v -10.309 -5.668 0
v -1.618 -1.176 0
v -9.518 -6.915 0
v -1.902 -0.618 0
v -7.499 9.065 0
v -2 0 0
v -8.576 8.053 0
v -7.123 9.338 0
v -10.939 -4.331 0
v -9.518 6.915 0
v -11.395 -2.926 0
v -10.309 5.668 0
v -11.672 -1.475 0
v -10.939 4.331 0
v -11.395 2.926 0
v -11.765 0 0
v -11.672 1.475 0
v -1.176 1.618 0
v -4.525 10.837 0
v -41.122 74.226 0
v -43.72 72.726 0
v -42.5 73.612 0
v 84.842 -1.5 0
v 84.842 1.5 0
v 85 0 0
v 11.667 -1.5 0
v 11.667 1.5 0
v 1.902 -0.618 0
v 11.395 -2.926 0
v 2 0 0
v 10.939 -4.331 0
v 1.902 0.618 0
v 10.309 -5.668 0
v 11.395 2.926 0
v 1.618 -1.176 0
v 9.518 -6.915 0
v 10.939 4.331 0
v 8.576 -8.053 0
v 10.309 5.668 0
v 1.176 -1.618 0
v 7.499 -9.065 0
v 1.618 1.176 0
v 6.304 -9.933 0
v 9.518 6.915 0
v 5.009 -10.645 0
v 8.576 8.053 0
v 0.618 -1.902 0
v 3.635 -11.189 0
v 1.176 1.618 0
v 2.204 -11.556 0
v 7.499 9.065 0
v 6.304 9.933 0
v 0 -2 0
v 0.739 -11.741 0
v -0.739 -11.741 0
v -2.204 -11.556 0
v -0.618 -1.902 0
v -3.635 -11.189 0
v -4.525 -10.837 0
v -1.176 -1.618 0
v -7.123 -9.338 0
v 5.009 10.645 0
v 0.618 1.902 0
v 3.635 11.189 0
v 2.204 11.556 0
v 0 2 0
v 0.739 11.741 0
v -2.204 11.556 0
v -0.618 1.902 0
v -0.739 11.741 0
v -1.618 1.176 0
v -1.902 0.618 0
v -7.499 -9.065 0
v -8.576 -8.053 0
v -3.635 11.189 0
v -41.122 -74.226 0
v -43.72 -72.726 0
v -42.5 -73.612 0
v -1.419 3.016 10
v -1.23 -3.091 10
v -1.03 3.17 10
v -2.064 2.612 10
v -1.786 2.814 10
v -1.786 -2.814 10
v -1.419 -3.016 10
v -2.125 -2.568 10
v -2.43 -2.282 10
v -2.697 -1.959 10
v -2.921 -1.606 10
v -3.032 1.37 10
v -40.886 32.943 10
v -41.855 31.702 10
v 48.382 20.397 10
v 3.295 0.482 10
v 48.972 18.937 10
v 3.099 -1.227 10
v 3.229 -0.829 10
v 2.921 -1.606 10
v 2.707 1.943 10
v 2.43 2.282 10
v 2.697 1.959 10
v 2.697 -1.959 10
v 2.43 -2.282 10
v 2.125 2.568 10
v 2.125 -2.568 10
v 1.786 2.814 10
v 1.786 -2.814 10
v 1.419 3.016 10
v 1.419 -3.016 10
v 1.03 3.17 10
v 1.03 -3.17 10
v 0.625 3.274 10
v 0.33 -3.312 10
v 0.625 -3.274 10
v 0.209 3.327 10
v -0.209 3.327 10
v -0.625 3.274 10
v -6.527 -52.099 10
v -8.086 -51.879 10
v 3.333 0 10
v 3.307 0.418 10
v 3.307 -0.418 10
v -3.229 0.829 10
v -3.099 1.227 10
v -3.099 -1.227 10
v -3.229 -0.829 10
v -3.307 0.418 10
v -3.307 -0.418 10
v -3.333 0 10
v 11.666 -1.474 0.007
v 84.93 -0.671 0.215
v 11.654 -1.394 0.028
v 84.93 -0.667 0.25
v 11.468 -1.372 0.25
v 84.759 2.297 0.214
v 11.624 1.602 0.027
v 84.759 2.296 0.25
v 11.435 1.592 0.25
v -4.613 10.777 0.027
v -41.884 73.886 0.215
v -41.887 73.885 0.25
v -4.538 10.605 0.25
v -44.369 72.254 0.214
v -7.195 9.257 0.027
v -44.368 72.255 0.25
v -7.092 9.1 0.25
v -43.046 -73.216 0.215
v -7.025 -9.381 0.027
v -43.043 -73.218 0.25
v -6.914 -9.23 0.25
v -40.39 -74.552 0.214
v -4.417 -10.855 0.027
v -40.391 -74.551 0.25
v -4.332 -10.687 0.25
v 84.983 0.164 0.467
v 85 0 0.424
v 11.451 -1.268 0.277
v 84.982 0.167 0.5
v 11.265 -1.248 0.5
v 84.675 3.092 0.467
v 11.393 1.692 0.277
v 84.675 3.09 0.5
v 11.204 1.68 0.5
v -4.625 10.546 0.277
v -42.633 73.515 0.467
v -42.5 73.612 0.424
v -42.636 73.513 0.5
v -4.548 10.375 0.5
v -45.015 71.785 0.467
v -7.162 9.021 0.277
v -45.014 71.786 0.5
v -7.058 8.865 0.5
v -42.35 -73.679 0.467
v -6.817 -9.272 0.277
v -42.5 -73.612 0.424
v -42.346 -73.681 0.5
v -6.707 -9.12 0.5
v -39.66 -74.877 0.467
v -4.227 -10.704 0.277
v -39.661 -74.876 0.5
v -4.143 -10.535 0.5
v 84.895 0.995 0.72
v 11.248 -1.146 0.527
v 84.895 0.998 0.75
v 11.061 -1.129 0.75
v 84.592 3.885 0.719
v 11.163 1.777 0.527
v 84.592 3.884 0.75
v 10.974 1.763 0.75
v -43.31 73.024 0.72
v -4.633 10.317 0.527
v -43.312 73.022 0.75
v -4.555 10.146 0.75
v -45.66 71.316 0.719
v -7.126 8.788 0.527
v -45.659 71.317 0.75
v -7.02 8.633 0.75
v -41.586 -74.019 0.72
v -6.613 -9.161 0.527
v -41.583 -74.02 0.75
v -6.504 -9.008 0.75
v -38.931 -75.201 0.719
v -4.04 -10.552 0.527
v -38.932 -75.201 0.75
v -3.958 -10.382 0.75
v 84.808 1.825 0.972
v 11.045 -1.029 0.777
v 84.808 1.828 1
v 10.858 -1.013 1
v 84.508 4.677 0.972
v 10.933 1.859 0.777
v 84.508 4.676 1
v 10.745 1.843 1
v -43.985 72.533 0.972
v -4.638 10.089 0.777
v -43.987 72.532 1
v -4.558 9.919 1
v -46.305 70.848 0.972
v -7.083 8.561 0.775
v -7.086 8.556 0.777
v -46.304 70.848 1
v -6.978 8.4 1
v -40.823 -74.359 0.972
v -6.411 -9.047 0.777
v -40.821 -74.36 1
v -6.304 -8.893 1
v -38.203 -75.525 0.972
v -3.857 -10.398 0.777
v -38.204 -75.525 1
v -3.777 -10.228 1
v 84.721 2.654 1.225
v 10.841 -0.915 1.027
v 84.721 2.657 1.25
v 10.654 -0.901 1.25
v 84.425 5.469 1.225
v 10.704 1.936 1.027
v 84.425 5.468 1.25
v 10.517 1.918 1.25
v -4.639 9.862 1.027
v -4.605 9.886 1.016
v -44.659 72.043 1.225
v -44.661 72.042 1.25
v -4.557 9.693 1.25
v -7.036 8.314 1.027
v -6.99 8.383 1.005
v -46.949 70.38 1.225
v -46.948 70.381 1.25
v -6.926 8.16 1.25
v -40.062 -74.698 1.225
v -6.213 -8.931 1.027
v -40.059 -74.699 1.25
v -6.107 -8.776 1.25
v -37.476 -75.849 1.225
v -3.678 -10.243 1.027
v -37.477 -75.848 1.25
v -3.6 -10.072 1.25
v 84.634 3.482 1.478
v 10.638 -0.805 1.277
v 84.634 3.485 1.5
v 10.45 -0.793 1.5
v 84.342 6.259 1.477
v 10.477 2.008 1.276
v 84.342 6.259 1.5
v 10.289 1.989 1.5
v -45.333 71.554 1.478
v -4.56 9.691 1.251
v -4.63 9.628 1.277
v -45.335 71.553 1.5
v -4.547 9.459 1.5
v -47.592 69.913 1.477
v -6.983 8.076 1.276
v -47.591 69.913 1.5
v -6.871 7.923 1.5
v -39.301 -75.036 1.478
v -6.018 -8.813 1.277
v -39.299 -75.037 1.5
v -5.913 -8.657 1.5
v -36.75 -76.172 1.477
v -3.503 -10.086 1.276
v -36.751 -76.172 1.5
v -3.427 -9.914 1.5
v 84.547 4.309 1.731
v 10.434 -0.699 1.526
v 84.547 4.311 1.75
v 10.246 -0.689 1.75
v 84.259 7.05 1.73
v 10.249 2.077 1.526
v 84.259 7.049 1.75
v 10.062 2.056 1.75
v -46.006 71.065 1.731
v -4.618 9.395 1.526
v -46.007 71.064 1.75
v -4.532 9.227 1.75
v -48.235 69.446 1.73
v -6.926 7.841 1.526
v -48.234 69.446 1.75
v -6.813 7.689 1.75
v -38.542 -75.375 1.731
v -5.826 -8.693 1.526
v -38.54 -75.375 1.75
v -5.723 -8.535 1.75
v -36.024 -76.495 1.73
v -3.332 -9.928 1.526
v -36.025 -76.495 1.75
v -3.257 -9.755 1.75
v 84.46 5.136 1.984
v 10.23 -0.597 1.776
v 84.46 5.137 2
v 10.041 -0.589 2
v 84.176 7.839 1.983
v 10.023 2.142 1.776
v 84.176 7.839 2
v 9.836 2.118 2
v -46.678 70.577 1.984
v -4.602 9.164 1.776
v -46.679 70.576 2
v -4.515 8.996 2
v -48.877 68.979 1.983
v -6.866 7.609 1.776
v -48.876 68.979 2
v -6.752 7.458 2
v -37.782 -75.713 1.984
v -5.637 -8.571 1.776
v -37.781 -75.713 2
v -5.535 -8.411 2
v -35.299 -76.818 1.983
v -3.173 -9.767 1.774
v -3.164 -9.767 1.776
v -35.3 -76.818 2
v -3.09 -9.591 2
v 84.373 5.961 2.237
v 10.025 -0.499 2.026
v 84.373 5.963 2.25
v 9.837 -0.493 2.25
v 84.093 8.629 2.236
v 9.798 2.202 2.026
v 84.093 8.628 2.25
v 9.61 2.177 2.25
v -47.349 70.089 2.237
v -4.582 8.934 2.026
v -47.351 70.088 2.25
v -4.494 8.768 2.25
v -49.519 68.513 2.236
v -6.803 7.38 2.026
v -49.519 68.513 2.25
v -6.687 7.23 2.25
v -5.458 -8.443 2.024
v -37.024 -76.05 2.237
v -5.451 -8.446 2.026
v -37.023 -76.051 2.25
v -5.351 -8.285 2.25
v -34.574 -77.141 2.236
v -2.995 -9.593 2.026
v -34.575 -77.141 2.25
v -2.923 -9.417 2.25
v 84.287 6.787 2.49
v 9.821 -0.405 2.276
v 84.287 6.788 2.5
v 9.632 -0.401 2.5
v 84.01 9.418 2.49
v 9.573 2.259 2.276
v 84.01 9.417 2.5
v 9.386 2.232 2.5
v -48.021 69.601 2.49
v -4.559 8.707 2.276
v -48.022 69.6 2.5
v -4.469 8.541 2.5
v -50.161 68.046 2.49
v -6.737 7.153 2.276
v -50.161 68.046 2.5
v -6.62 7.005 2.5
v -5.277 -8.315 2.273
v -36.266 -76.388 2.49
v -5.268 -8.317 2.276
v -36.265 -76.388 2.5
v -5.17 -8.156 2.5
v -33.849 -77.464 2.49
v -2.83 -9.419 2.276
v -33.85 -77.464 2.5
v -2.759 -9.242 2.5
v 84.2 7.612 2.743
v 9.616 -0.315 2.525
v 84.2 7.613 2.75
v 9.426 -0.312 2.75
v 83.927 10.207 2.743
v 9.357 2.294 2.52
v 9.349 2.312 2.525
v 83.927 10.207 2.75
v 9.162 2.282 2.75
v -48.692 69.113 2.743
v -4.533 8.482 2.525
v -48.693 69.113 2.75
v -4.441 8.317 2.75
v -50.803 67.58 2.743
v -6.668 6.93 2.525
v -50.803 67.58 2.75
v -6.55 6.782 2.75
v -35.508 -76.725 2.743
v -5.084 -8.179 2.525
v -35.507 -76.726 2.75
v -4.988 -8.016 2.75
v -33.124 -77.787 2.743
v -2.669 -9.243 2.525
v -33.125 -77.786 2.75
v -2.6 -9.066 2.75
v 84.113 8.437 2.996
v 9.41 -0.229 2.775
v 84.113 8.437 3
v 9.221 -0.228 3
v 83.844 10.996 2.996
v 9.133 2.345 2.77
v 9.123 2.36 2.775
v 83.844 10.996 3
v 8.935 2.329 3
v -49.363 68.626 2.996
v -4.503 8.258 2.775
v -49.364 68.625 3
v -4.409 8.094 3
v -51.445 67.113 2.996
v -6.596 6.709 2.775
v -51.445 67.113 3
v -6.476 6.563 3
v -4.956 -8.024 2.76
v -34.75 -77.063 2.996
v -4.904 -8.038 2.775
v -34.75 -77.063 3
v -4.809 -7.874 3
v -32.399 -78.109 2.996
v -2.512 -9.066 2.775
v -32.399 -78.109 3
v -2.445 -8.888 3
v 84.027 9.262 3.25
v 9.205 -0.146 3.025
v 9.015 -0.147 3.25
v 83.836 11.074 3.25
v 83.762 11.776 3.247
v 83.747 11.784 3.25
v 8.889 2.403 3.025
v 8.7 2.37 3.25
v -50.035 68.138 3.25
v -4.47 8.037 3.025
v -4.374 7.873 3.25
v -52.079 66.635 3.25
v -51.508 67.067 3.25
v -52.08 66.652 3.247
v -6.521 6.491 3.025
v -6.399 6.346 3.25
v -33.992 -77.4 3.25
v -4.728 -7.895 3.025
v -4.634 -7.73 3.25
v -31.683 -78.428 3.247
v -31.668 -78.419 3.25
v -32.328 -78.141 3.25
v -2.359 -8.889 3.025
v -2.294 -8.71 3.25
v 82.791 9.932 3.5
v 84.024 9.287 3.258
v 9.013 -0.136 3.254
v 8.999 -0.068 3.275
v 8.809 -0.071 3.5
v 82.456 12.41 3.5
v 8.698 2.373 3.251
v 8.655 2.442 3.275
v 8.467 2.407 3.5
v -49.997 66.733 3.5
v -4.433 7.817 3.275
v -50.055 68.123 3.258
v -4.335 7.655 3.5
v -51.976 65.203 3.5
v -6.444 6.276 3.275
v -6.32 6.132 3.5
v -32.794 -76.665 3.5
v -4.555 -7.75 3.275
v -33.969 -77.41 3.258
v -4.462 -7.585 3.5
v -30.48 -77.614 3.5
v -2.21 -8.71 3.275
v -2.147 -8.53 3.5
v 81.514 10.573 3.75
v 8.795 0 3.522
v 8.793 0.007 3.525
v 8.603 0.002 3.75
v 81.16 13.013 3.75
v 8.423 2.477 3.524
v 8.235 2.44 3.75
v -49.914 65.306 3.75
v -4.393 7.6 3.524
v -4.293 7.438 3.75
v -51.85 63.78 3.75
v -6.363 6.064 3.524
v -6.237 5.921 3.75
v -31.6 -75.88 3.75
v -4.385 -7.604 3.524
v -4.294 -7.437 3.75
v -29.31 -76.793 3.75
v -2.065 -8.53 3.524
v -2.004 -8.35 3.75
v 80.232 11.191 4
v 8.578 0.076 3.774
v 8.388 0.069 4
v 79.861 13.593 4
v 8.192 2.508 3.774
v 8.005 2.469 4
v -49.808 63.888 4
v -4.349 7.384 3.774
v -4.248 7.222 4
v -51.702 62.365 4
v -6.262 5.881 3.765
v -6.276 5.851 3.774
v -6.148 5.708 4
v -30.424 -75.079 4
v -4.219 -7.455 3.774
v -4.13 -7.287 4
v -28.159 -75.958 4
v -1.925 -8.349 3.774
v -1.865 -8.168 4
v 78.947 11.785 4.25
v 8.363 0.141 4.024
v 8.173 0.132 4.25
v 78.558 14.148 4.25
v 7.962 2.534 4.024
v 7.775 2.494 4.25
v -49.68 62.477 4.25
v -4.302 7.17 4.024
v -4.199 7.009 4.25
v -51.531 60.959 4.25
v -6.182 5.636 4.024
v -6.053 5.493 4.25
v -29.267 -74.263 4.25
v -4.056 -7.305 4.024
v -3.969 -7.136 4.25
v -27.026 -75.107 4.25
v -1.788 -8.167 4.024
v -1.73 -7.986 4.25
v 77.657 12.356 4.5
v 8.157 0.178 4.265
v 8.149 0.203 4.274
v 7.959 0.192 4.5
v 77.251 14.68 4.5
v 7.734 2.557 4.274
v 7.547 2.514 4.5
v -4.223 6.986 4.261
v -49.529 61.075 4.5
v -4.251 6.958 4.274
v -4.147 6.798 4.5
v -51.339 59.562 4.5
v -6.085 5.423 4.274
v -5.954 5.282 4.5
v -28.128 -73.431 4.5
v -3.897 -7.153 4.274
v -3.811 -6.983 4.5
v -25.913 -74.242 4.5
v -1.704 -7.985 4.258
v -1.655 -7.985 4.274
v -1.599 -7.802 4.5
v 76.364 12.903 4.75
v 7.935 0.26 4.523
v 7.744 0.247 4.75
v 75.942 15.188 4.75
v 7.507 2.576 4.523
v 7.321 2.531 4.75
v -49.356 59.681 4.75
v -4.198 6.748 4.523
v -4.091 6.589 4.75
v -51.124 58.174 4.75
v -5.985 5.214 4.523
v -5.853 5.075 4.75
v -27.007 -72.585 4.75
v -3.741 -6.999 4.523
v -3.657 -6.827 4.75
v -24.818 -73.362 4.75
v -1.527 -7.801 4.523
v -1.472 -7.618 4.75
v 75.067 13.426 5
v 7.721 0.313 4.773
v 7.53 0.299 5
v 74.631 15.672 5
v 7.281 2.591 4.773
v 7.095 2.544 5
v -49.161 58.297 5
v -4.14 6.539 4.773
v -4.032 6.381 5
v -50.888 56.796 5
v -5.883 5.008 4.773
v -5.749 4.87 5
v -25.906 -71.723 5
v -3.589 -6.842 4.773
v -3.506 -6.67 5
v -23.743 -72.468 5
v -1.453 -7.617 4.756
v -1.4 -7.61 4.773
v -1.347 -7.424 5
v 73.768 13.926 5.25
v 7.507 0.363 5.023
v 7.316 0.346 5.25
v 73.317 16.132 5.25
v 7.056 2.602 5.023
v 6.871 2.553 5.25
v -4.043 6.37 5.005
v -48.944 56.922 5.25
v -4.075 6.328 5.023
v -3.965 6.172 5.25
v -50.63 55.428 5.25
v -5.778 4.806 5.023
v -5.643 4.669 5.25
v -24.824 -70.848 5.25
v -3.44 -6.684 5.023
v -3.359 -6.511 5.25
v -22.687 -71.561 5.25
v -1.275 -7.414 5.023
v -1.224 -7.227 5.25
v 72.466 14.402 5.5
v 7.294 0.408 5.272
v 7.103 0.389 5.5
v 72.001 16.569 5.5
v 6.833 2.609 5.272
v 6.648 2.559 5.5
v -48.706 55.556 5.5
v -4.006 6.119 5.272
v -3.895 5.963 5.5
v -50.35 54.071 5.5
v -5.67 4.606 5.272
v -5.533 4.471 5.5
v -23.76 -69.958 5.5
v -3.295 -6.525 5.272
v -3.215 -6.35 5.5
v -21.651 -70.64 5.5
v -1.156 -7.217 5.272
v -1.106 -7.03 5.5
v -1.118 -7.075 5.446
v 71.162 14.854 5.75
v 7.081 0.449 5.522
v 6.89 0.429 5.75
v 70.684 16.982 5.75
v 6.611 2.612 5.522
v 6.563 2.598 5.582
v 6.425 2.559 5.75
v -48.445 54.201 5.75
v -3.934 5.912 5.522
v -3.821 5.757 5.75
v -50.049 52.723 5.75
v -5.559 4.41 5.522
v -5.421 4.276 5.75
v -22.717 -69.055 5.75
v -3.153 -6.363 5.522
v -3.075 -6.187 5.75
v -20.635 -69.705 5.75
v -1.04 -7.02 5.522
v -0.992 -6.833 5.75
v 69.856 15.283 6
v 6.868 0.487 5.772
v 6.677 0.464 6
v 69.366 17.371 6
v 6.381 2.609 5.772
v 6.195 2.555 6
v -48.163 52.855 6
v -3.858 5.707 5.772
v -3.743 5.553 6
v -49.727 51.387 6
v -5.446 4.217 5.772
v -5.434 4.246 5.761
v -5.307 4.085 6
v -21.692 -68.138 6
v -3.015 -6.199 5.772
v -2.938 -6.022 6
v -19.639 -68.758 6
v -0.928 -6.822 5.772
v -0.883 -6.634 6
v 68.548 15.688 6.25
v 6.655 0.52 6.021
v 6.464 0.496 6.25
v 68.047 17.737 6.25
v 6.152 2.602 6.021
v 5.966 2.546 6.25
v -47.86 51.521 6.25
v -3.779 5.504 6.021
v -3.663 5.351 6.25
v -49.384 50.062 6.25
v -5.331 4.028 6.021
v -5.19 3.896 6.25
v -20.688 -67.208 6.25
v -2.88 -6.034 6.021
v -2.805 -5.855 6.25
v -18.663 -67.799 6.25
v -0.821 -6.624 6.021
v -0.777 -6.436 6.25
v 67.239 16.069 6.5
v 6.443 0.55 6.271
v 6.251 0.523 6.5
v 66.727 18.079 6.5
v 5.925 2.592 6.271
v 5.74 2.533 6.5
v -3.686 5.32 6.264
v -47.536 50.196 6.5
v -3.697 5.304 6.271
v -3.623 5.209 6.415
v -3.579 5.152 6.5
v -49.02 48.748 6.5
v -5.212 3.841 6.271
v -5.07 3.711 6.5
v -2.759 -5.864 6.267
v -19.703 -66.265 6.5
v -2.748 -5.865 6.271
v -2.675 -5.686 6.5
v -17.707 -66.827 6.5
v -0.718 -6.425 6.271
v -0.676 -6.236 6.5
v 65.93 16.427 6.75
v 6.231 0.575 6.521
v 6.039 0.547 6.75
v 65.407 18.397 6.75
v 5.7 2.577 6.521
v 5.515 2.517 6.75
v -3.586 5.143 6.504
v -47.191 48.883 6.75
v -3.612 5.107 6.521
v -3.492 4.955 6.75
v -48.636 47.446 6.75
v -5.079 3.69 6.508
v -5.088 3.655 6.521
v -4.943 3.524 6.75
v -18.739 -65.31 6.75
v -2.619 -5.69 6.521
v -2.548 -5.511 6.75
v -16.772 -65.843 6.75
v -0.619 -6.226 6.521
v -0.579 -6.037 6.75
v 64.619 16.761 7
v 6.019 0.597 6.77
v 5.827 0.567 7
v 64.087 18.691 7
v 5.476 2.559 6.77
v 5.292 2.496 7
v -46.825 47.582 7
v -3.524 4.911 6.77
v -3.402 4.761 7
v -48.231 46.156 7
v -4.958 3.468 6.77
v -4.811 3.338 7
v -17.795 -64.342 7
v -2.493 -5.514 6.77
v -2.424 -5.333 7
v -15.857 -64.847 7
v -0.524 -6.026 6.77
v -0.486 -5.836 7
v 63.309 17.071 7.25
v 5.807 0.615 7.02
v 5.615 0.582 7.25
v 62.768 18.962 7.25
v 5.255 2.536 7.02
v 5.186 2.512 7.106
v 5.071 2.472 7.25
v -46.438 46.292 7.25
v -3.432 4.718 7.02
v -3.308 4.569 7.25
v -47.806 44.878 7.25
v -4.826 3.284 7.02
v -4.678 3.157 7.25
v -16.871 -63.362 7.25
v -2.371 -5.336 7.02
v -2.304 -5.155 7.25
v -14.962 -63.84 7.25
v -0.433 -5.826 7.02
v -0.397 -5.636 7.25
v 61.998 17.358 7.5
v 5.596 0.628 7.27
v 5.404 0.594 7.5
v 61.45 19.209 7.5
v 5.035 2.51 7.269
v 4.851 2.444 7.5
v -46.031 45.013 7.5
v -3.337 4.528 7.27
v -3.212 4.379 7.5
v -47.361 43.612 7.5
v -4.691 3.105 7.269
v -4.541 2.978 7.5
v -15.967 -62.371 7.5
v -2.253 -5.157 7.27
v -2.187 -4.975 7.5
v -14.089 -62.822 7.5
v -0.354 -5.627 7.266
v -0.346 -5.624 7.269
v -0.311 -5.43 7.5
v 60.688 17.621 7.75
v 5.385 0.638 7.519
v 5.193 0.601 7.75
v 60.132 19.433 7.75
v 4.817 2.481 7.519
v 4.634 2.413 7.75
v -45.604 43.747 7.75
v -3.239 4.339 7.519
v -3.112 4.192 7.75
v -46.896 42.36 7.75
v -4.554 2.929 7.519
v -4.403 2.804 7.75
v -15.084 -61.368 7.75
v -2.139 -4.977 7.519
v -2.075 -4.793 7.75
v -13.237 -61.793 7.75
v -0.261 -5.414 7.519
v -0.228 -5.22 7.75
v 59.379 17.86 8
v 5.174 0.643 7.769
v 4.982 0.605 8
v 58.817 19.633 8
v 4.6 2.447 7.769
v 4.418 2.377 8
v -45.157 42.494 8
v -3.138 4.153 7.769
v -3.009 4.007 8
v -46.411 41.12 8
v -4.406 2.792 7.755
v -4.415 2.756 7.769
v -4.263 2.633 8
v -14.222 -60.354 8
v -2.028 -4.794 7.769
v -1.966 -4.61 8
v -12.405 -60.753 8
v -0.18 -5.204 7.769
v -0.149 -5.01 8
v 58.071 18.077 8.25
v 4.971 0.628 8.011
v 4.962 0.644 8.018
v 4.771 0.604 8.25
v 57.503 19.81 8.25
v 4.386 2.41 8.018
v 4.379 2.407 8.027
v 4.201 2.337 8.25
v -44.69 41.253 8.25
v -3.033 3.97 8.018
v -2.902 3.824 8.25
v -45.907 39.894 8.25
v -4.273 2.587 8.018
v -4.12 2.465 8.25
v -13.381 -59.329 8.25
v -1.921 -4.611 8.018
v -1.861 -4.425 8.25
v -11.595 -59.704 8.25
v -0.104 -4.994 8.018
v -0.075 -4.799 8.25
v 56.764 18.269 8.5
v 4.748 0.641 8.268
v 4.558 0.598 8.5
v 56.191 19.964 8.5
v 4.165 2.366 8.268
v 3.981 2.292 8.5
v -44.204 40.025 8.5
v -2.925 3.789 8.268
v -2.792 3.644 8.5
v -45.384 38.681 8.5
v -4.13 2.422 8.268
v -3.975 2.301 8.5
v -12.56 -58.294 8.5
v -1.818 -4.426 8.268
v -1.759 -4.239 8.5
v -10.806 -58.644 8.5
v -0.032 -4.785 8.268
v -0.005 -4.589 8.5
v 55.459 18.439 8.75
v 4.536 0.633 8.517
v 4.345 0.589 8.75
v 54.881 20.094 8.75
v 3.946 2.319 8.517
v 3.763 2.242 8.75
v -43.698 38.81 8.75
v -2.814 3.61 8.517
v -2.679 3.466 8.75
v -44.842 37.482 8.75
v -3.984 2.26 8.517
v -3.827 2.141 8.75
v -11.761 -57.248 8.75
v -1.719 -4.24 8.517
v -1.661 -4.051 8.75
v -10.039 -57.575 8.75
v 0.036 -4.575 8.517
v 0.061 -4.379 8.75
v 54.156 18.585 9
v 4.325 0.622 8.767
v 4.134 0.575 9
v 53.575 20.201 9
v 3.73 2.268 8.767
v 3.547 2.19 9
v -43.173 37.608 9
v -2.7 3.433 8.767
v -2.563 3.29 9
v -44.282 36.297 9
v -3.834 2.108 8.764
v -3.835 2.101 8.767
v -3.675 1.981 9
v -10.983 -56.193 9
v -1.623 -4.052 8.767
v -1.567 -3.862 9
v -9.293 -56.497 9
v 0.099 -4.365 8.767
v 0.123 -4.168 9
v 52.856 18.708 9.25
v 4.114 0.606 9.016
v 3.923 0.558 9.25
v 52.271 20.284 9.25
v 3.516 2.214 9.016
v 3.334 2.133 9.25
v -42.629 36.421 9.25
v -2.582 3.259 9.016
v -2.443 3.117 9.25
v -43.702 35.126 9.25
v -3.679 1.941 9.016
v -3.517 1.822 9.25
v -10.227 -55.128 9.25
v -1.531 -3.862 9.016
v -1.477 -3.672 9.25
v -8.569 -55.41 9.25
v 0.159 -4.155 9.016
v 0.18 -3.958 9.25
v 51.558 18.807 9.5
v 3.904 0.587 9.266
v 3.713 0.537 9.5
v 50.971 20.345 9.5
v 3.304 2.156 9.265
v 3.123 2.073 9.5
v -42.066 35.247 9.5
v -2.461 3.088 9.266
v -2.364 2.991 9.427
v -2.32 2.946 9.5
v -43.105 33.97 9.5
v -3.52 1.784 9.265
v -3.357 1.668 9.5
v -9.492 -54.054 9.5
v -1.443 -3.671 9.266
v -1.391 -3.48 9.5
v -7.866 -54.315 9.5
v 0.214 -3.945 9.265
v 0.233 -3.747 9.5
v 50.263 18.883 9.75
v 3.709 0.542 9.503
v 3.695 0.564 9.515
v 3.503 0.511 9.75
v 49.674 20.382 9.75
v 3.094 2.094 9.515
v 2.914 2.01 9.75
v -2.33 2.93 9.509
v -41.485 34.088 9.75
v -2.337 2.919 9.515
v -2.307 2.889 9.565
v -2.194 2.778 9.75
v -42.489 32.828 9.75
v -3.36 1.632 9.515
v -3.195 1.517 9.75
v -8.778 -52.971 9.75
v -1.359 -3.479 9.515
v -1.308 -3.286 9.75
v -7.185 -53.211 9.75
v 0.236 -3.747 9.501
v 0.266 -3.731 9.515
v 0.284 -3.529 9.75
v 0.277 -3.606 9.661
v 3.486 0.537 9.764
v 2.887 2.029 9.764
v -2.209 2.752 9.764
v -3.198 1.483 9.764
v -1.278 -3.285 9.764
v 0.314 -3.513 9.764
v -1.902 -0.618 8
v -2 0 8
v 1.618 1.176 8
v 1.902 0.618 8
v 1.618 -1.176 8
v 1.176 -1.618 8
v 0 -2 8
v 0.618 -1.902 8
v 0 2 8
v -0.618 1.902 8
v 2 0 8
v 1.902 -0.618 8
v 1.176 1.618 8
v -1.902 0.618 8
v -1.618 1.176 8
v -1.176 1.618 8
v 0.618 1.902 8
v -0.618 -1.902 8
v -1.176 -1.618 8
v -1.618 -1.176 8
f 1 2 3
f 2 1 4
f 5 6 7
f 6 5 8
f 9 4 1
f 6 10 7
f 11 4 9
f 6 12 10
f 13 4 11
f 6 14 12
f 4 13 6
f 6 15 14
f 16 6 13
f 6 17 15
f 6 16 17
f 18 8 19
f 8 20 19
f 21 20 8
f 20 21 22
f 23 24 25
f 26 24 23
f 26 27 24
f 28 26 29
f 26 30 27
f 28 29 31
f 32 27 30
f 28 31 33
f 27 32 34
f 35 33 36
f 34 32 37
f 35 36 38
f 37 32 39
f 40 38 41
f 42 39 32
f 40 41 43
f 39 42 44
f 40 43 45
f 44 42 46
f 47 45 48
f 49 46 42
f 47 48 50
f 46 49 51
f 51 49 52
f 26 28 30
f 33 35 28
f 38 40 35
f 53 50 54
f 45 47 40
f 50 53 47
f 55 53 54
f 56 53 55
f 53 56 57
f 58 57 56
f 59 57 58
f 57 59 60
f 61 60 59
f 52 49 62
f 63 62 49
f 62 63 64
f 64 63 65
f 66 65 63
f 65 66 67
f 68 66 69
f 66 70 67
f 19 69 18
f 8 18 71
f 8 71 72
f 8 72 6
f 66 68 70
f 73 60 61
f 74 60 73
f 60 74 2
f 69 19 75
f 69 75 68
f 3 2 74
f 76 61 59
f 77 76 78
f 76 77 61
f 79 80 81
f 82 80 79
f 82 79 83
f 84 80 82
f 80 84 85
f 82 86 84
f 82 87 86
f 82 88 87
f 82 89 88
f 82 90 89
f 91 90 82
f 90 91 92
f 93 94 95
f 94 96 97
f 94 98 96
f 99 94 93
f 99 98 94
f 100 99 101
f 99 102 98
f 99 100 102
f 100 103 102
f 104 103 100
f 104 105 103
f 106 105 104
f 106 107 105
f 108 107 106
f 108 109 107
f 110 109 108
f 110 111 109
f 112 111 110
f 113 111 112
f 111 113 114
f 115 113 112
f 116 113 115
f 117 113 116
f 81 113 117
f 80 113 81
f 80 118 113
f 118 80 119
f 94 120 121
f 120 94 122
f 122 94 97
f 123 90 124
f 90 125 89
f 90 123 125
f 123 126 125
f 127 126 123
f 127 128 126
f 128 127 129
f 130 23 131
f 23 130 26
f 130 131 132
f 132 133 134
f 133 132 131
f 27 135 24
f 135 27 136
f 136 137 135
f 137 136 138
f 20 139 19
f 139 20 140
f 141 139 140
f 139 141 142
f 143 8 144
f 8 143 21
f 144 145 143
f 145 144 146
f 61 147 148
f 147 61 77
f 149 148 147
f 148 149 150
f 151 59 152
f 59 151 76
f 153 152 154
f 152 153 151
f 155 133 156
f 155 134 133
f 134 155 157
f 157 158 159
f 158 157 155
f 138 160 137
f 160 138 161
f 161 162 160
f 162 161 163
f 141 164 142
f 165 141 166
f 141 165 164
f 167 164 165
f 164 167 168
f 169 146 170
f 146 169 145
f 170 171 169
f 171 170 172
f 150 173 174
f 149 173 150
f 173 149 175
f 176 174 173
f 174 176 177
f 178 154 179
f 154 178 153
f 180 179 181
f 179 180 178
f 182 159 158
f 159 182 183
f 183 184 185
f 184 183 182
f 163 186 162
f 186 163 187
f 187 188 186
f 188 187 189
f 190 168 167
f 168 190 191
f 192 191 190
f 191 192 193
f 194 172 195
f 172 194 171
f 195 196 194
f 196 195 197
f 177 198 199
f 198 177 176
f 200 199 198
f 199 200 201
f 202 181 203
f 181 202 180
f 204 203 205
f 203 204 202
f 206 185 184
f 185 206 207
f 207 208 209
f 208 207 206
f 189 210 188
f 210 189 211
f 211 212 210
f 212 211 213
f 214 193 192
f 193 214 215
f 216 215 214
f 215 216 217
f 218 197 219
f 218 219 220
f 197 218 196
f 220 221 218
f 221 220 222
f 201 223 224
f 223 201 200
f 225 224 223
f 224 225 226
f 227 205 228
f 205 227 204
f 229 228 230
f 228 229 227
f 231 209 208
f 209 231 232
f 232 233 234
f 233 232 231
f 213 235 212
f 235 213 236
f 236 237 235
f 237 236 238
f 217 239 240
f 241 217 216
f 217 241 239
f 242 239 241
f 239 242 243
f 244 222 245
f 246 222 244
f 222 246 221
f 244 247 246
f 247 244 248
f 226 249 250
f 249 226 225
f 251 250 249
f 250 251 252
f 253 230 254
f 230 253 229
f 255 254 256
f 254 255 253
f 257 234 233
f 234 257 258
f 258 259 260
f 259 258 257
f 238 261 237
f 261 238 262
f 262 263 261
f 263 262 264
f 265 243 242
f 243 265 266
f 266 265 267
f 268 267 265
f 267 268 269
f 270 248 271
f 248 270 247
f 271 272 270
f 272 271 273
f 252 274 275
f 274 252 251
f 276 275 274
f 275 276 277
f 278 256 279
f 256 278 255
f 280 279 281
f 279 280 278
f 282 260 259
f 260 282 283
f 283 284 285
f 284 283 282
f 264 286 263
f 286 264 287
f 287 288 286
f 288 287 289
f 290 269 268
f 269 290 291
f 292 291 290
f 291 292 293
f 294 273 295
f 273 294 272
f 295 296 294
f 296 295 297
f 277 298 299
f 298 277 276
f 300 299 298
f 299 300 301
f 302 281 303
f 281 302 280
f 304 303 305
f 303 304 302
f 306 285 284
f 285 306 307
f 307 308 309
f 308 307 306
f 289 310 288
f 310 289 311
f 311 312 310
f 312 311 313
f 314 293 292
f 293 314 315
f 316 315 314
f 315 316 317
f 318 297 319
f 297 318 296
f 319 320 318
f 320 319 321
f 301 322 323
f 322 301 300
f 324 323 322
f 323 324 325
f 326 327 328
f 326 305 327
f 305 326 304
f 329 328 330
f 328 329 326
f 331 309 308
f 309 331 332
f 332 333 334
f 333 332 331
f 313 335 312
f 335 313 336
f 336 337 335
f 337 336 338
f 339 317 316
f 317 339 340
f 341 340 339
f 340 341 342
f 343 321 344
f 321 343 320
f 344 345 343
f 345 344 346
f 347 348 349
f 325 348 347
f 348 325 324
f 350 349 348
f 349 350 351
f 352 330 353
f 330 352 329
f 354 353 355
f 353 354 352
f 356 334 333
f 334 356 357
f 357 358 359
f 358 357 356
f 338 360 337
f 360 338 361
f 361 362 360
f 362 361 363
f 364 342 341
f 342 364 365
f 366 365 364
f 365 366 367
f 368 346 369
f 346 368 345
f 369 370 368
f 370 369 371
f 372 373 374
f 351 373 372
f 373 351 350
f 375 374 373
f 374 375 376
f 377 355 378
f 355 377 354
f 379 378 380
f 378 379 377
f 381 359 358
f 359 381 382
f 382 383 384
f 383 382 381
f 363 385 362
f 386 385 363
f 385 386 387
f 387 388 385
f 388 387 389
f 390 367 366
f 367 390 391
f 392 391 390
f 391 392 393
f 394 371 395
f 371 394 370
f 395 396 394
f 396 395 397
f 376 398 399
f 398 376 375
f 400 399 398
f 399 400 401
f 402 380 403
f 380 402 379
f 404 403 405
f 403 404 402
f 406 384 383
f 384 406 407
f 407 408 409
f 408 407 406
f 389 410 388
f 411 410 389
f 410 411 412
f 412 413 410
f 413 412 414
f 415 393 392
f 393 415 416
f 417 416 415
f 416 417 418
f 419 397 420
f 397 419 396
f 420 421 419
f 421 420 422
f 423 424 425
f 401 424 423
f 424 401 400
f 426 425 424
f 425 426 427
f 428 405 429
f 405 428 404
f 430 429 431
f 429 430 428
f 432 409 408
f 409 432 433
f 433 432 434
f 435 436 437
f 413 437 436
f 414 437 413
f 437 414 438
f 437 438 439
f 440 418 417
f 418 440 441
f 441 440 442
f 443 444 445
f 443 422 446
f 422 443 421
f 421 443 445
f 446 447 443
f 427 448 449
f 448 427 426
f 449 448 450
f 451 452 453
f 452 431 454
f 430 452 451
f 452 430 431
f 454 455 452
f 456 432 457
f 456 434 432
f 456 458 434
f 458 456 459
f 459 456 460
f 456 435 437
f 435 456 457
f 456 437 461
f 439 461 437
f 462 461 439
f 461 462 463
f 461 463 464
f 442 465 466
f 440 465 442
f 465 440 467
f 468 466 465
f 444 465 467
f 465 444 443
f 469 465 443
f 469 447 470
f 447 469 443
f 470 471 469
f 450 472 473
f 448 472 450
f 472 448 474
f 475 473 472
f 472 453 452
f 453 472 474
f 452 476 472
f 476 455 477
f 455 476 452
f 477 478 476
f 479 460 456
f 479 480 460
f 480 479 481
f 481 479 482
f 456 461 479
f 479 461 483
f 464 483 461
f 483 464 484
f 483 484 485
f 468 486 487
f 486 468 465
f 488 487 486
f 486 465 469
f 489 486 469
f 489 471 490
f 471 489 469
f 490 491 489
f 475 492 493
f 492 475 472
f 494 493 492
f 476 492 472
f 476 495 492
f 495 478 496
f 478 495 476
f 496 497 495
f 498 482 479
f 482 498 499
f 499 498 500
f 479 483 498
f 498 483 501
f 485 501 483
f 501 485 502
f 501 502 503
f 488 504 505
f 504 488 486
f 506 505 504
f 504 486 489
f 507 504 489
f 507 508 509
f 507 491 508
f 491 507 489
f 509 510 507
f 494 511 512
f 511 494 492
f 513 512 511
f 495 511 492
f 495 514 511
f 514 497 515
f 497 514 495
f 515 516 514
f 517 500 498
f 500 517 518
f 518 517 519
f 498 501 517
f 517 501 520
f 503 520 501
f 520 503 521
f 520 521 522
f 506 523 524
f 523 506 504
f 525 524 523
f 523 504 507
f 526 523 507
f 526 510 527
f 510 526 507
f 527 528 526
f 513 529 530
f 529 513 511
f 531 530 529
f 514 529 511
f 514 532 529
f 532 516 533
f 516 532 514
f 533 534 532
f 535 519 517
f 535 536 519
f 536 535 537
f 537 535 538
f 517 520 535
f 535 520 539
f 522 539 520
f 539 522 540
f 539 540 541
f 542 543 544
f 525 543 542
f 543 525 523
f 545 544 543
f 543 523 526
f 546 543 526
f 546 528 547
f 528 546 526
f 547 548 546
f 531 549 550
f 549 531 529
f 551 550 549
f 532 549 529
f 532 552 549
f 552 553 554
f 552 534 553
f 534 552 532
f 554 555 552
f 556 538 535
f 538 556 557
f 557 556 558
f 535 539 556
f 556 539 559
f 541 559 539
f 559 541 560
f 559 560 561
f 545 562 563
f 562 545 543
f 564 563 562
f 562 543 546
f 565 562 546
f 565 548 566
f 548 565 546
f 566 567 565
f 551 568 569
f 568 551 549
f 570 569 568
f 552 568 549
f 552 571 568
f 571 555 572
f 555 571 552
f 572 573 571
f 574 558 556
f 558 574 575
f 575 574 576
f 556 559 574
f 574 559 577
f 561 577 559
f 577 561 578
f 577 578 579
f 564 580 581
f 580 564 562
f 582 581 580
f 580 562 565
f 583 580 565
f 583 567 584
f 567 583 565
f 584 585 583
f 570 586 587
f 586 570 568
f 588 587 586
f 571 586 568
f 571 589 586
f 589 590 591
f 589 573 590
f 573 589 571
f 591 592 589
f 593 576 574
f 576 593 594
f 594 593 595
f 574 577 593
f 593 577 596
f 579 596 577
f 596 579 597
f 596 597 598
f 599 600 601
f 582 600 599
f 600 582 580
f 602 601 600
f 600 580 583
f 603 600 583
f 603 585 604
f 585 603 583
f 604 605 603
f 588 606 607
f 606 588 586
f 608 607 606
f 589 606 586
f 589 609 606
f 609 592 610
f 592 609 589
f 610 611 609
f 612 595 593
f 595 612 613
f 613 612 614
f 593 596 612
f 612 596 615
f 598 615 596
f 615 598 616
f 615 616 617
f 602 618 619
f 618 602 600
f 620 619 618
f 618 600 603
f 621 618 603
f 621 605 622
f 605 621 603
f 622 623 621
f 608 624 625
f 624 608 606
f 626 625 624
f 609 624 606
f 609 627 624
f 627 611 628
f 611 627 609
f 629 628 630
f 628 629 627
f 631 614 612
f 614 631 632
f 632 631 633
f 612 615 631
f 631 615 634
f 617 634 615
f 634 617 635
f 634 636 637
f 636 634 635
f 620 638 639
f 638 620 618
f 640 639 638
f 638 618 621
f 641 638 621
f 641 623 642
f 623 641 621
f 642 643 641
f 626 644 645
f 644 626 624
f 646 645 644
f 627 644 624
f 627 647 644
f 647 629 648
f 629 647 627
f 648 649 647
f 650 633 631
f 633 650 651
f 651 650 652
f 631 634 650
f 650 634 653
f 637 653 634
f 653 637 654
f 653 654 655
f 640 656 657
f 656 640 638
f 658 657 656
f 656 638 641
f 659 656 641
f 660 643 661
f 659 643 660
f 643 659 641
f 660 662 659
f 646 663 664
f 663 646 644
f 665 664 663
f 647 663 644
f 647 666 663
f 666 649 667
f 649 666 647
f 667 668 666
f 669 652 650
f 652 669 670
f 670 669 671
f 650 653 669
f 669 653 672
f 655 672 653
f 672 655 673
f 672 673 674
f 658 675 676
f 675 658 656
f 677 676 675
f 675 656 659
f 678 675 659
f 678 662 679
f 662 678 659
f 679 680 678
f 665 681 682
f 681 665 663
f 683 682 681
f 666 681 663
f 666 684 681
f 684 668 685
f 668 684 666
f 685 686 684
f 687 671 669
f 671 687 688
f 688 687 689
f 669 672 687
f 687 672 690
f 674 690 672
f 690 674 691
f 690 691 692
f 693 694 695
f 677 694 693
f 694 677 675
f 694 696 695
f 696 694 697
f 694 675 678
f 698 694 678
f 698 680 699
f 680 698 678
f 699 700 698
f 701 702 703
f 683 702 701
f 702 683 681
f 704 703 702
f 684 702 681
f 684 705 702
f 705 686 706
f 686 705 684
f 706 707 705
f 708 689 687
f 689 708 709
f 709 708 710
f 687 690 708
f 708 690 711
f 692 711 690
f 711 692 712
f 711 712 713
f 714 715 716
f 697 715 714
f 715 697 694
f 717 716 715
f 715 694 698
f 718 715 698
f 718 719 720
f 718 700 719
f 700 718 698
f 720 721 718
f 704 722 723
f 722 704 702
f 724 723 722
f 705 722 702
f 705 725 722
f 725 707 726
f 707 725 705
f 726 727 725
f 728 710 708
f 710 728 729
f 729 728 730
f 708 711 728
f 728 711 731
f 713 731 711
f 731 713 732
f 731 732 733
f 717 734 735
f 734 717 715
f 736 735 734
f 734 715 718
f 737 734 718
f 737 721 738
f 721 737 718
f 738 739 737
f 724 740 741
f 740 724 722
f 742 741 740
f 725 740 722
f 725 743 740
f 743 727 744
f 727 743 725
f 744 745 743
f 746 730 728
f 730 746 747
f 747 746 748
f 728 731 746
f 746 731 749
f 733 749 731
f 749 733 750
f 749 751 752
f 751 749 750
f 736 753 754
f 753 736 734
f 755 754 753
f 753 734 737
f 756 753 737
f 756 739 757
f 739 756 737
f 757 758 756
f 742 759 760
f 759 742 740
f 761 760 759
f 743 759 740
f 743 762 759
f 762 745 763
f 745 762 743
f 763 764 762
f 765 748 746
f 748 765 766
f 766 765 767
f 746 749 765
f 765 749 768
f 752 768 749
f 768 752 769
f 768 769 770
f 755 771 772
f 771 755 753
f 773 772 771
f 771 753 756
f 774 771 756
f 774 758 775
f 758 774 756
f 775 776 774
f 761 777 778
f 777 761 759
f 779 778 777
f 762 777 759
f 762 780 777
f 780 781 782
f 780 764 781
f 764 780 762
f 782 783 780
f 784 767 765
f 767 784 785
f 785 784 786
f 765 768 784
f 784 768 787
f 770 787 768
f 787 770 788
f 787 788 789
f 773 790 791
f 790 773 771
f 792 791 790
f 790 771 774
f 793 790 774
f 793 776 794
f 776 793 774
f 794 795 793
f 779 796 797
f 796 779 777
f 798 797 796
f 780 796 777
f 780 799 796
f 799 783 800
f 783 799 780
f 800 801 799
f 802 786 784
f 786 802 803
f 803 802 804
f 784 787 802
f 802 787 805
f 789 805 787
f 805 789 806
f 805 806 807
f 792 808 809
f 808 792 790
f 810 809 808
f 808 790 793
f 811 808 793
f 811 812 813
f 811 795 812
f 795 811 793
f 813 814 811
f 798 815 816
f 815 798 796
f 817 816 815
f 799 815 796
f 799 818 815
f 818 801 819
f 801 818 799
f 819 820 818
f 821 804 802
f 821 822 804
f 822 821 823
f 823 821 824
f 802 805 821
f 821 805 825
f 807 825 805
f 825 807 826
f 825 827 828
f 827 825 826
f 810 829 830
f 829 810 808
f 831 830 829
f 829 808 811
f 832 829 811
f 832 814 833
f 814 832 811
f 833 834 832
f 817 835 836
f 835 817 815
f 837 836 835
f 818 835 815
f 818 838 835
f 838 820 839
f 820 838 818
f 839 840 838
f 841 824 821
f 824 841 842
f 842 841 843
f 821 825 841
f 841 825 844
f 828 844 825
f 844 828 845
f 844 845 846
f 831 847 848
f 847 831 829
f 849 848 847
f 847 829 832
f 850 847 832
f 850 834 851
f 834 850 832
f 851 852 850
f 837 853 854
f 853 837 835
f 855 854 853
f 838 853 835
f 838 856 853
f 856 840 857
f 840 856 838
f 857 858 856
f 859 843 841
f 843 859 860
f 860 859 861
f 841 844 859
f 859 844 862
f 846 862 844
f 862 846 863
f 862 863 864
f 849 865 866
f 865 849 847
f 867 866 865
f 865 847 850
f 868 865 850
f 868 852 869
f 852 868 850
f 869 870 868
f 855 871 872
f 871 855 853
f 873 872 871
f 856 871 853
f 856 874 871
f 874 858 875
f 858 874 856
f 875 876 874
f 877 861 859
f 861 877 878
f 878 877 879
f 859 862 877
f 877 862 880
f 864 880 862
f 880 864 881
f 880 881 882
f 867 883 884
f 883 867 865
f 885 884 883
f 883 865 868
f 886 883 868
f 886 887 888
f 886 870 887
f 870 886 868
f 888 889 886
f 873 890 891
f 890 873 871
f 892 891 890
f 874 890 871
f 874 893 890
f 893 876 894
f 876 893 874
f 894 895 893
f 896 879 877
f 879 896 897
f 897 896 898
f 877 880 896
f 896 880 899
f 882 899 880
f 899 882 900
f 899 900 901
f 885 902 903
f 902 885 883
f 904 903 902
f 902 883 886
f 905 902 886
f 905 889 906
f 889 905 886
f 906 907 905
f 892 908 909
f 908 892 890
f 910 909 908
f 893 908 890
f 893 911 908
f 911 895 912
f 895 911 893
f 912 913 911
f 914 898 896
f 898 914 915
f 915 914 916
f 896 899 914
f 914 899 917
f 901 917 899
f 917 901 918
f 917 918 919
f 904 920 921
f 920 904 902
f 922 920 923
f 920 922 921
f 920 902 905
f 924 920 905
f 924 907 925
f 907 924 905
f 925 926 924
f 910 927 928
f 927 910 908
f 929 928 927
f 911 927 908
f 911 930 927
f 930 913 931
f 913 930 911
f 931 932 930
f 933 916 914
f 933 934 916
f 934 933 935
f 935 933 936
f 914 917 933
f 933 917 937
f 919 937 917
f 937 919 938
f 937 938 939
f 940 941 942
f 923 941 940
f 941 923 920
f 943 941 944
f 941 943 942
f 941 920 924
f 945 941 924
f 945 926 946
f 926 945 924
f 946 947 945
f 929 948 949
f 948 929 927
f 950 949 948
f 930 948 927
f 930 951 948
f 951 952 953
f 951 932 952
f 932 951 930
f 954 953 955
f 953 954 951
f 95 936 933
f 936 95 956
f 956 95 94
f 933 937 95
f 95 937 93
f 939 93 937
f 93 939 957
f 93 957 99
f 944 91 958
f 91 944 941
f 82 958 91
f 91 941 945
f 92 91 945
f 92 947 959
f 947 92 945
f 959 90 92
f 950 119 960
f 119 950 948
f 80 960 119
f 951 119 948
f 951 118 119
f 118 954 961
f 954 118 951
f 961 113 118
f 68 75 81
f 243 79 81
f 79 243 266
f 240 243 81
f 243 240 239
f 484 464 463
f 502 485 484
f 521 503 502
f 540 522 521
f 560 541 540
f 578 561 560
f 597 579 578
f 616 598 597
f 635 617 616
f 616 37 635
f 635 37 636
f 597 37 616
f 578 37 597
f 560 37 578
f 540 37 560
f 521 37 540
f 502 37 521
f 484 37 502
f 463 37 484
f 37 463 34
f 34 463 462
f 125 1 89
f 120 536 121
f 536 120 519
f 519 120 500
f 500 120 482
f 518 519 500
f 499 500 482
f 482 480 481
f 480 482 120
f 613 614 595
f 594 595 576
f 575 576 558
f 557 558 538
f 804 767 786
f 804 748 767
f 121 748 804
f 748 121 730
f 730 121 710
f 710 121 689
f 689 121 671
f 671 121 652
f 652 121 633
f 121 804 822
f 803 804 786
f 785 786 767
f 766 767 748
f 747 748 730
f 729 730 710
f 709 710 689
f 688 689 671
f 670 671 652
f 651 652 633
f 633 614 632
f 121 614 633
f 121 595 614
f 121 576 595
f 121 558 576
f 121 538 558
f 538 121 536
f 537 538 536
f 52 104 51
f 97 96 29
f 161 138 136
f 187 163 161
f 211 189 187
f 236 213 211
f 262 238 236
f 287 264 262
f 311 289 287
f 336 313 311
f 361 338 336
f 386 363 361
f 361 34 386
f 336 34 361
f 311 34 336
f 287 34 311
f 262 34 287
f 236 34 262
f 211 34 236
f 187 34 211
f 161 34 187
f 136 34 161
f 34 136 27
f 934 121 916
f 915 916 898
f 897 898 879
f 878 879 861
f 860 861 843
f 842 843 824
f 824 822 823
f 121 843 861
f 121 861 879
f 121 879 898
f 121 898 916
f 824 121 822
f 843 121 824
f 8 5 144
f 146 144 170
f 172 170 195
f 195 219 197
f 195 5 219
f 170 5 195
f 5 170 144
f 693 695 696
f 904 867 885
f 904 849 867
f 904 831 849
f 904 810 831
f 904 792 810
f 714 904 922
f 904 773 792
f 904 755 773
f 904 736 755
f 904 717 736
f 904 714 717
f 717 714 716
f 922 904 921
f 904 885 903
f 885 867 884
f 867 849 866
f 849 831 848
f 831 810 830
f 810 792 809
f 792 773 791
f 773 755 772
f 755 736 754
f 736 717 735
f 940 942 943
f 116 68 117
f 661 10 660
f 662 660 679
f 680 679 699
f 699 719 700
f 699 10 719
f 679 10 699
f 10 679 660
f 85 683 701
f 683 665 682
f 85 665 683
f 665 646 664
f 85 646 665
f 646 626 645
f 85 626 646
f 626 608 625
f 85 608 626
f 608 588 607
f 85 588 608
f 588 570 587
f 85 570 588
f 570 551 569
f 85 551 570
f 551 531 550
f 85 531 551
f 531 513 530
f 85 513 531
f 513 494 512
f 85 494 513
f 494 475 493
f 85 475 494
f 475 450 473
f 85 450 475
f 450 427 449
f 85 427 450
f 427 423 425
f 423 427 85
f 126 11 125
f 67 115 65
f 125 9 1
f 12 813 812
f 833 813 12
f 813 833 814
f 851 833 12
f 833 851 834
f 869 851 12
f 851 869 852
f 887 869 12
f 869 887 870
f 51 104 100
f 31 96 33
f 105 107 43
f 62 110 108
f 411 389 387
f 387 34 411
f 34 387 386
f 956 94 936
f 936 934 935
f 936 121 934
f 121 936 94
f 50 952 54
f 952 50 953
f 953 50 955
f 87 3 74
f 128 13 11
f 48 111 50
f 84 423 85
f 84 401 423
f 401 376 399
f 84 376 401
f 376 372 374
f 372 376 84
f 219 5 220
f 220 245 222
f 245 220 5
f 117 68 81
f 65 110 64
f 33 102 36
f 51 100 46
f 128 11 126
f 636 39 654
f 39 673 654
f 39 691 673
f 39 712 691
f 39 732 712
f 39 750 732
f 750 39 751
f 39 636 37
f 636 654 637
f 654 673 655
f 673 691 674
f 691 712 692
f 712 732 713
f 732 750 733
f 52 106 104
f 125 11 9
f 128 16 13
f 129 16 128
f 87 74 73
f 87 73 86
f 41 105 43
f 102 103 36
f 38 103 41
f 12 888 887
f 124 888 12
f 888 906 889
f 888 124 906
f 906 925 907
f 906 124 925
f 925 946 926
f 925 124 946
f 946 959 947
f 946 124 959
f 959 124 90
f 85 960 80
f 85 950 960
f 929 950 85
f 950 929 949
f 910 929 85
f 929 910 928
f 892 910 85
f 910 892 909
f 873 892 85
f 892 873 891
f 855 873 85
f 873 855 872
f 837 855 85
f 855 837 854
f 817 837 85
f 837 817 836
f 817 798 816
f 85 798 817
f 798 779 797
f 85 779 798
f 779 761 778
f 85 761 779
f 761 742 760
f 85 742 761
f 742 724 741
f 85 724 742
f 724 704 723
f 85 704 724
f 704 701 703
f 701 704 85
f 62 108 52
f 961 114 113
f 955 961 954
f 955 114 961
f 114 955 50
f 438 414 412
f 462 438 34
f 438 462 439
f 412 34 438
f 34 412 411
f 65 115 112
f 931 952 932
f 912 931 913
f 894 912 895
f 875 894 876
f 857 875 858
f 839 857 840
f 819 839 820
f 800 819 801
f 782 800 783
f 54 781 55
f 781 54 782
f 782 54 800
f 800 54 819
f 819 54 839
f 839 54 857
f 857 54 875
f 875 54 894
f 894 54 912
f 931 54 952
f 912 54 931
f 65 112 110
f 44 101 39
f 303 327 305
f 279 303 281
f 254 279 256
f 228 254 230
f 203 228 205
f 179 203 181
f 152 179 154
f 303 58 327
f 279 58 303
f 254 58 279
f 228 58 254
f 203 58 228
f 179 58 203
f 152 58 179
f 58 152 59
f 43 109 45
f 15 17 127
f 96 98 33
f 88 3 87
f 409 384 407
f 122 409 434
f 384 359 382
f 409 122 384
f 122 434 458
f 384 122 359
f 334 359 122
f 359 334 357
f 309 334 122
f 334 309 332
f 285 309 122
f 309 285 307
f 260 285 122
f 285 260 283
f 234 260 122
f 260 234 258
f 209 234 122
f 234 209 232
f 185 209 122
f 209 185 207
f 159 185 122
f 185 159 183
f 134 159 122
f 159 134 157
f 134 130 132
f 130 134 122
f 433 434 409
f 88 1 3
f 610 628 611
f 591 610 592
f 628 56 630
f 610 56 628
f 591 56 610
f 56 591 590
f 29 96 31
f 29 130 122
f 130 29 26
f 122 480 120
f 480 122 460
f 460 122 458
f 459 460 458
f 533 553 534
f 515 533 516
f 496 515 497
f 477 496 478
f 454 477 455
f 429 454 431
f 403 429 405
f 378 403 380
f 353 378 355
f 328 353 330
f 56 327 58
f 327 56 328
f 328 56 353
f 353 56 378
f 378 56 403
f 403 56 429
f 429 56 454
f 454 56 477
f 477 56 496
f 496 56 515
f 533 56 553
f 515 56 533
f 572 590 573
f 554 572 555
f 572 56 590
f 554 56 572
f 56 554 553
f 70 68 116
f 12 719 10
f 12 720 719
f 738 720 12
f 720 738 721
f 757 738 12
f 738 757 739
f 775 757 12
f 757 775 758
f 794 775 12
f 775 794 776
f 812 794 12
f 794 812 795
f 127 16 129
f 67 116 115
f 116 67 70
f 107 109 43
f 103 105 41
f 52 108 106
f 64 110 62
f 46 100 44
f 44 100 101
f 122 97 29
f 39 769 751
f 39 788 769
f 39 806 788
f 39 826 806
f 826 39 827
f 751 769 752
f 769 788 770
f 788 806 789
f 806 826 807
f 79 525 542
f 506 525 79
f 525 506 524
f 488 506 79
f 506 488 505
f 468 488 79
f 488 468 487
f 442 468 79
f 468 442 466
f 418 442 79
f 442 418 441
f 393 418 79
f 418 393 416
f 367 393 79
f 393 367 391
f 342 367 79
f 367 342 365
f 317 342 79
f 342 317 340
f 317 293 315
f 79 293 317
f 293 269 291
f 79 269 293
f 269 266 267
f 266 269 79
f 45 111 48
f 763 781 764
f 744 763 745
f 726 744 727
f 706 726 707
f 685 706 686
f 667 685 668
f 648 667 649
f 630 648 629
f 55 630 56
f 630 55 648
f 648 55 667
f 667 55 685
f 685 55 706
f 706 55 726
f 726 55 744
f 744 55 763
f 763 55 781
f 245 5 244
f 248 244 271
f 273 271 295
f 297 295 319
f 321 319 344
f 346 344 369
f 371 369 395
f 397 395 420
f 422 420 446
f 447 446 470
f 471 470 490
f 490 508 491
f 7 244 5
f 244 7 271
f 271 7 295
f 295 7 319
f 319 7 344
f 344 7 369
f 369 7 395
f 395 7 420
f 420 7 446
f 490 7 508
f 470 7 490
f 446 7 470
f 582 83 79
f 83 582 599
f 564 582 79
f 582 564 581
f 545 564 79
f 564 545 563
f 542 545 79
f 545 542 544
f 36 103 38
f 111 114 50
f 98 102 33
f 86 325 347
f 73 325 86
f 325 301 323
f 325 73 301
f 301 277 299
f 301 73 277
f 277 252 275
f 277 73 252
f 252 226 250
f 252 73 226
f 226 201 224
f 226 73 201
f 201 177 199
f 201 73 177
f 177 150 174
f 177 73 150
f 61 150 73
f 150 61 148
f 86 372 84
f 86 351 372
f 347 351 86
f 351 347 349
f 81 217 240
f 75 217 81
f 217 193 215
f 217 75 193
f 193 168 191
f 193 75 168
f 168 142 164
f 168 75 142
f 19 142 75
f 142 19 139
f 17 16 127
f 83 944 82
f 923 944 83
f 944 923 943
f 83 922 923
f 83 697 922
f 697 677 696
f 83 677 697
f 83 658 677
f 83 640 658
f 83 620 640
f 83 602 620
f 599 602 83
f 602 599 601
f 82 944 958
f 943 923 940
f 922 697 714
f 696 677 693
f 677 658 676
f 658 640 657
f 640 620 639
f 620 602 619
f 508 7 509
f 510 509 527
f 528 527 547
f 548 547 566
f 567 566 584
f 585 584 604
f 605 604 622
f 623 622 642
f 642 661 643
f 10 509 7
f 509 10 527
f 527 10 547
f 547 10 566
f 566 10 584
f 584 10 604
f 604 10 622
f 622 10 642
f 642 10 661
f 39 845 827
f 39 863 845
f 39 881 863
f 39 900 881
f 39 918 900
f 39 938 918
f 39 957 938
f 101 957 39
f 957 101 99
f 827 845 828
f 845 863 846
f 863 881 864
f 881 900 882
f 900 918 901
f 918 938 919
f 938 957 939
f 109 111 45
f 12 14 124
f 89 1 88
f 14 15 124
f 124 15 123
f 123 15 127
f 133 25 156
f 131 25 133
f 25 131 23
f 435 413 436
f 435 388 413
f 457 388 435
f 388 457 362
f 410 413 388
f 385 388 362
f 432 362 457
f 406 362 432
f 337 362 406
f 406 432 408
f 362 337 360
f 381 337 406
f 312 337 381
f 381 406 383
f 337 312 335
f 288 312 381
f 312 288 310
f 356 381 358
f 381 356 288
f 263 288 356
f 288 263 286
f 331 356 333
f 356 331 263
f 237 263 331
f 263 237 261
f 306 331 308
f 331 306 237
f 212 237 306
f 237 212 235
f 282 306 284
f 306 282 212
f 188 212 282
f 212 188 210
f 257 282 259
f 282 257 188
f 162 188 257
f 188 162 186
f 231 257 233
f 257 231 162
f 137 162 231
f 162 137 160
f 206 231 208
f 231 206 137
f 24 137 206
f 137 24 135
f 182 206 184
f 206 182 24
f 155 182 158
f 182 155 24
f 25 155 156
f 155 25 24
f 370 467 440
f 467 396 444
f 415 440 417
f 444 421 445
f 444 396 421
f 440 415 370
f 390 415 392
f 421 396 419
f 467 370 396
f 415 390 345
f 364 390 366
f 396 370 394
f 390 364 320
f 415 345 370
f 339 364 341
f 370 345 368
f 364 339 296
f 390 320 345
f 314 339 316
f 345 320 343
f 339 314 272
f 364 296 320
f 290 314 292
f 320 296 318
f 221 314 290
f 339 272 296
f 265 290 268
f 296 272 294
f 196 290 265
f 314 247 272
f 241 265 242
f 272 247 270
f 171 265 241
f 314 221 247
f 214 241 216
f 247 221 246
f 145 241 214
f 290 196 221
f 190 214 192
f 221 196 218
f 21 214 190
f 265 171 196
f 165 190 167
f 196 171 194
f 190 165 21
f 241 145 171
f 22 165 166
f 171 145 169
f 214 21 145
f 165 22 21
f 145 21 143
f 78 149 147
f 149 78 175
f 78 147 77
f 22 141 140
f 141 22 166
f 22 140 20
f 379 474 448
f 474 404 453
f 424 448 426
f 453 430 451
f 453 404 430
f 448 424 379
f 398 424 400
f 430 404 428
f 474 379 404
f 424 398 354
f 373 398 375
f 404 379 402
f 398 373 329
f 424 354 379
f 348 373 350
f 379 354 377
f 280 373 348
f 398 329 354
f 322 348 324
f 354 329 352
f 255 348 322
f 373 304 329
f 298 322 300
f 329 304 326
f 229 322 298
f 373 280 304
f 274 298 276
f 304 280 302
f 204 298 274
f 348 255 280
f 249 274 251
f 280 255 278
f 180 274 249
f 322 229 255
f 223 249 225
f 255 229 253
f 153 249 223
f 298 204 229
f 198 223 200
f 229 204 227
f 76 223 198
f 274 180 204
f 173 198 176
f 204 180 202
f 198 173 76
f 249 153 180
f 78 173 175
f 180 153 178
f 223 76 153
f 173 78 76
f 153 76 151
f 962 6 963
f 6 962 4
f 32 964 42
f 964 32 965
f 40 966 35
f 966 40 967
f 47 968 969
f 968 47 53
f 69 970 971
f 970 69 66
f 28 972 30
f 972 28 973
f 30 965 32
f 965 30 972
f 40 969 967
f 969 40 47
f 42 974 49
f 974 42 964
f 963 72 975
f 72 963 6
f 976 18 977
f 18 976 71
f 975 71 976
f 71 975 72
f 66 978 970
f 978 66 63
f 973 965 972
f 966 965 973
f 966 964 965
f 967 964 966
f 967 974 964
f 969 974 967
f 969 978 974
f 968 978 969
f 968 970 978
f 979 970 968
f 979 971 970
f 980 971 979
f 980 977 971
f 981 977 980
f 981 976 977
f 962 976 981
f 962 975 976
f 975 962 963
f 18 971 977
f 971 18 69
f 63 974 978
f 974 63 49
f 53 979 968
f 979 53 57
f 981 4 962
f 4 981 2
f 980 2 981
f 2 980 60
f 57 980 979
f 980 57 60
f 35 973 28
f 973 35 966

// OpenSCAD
sides = 3;
angle = 360 / sides;
radius = 100;
rotate([0, 0, $t*angle]) union() {
	difference() {
		union() {
			linear_extrude(10, scale=.525,twist=-22,slices=40) for (rot = [0 : angle : 359])
			rotate(rot) translate([0,-1.5,0]) square([radius,3],center=false);
			cylinder(h=10,r1=radius/8.5,r2=radius/30,$fn=50);
		}
		cylinder(h=8,r=2,$fn=20);
		difference() {
			cylinder(r=radius+.5,h=10,slices=50);
			cylinder(r=radius*.85,h=10, slices=50);
		}
	}
//	translate([0,0,1.5]) rotate_extrude($fn=90) translate([radius*.85,0,0]) //circle(r=1.5,center=true,$fn=40);
}
